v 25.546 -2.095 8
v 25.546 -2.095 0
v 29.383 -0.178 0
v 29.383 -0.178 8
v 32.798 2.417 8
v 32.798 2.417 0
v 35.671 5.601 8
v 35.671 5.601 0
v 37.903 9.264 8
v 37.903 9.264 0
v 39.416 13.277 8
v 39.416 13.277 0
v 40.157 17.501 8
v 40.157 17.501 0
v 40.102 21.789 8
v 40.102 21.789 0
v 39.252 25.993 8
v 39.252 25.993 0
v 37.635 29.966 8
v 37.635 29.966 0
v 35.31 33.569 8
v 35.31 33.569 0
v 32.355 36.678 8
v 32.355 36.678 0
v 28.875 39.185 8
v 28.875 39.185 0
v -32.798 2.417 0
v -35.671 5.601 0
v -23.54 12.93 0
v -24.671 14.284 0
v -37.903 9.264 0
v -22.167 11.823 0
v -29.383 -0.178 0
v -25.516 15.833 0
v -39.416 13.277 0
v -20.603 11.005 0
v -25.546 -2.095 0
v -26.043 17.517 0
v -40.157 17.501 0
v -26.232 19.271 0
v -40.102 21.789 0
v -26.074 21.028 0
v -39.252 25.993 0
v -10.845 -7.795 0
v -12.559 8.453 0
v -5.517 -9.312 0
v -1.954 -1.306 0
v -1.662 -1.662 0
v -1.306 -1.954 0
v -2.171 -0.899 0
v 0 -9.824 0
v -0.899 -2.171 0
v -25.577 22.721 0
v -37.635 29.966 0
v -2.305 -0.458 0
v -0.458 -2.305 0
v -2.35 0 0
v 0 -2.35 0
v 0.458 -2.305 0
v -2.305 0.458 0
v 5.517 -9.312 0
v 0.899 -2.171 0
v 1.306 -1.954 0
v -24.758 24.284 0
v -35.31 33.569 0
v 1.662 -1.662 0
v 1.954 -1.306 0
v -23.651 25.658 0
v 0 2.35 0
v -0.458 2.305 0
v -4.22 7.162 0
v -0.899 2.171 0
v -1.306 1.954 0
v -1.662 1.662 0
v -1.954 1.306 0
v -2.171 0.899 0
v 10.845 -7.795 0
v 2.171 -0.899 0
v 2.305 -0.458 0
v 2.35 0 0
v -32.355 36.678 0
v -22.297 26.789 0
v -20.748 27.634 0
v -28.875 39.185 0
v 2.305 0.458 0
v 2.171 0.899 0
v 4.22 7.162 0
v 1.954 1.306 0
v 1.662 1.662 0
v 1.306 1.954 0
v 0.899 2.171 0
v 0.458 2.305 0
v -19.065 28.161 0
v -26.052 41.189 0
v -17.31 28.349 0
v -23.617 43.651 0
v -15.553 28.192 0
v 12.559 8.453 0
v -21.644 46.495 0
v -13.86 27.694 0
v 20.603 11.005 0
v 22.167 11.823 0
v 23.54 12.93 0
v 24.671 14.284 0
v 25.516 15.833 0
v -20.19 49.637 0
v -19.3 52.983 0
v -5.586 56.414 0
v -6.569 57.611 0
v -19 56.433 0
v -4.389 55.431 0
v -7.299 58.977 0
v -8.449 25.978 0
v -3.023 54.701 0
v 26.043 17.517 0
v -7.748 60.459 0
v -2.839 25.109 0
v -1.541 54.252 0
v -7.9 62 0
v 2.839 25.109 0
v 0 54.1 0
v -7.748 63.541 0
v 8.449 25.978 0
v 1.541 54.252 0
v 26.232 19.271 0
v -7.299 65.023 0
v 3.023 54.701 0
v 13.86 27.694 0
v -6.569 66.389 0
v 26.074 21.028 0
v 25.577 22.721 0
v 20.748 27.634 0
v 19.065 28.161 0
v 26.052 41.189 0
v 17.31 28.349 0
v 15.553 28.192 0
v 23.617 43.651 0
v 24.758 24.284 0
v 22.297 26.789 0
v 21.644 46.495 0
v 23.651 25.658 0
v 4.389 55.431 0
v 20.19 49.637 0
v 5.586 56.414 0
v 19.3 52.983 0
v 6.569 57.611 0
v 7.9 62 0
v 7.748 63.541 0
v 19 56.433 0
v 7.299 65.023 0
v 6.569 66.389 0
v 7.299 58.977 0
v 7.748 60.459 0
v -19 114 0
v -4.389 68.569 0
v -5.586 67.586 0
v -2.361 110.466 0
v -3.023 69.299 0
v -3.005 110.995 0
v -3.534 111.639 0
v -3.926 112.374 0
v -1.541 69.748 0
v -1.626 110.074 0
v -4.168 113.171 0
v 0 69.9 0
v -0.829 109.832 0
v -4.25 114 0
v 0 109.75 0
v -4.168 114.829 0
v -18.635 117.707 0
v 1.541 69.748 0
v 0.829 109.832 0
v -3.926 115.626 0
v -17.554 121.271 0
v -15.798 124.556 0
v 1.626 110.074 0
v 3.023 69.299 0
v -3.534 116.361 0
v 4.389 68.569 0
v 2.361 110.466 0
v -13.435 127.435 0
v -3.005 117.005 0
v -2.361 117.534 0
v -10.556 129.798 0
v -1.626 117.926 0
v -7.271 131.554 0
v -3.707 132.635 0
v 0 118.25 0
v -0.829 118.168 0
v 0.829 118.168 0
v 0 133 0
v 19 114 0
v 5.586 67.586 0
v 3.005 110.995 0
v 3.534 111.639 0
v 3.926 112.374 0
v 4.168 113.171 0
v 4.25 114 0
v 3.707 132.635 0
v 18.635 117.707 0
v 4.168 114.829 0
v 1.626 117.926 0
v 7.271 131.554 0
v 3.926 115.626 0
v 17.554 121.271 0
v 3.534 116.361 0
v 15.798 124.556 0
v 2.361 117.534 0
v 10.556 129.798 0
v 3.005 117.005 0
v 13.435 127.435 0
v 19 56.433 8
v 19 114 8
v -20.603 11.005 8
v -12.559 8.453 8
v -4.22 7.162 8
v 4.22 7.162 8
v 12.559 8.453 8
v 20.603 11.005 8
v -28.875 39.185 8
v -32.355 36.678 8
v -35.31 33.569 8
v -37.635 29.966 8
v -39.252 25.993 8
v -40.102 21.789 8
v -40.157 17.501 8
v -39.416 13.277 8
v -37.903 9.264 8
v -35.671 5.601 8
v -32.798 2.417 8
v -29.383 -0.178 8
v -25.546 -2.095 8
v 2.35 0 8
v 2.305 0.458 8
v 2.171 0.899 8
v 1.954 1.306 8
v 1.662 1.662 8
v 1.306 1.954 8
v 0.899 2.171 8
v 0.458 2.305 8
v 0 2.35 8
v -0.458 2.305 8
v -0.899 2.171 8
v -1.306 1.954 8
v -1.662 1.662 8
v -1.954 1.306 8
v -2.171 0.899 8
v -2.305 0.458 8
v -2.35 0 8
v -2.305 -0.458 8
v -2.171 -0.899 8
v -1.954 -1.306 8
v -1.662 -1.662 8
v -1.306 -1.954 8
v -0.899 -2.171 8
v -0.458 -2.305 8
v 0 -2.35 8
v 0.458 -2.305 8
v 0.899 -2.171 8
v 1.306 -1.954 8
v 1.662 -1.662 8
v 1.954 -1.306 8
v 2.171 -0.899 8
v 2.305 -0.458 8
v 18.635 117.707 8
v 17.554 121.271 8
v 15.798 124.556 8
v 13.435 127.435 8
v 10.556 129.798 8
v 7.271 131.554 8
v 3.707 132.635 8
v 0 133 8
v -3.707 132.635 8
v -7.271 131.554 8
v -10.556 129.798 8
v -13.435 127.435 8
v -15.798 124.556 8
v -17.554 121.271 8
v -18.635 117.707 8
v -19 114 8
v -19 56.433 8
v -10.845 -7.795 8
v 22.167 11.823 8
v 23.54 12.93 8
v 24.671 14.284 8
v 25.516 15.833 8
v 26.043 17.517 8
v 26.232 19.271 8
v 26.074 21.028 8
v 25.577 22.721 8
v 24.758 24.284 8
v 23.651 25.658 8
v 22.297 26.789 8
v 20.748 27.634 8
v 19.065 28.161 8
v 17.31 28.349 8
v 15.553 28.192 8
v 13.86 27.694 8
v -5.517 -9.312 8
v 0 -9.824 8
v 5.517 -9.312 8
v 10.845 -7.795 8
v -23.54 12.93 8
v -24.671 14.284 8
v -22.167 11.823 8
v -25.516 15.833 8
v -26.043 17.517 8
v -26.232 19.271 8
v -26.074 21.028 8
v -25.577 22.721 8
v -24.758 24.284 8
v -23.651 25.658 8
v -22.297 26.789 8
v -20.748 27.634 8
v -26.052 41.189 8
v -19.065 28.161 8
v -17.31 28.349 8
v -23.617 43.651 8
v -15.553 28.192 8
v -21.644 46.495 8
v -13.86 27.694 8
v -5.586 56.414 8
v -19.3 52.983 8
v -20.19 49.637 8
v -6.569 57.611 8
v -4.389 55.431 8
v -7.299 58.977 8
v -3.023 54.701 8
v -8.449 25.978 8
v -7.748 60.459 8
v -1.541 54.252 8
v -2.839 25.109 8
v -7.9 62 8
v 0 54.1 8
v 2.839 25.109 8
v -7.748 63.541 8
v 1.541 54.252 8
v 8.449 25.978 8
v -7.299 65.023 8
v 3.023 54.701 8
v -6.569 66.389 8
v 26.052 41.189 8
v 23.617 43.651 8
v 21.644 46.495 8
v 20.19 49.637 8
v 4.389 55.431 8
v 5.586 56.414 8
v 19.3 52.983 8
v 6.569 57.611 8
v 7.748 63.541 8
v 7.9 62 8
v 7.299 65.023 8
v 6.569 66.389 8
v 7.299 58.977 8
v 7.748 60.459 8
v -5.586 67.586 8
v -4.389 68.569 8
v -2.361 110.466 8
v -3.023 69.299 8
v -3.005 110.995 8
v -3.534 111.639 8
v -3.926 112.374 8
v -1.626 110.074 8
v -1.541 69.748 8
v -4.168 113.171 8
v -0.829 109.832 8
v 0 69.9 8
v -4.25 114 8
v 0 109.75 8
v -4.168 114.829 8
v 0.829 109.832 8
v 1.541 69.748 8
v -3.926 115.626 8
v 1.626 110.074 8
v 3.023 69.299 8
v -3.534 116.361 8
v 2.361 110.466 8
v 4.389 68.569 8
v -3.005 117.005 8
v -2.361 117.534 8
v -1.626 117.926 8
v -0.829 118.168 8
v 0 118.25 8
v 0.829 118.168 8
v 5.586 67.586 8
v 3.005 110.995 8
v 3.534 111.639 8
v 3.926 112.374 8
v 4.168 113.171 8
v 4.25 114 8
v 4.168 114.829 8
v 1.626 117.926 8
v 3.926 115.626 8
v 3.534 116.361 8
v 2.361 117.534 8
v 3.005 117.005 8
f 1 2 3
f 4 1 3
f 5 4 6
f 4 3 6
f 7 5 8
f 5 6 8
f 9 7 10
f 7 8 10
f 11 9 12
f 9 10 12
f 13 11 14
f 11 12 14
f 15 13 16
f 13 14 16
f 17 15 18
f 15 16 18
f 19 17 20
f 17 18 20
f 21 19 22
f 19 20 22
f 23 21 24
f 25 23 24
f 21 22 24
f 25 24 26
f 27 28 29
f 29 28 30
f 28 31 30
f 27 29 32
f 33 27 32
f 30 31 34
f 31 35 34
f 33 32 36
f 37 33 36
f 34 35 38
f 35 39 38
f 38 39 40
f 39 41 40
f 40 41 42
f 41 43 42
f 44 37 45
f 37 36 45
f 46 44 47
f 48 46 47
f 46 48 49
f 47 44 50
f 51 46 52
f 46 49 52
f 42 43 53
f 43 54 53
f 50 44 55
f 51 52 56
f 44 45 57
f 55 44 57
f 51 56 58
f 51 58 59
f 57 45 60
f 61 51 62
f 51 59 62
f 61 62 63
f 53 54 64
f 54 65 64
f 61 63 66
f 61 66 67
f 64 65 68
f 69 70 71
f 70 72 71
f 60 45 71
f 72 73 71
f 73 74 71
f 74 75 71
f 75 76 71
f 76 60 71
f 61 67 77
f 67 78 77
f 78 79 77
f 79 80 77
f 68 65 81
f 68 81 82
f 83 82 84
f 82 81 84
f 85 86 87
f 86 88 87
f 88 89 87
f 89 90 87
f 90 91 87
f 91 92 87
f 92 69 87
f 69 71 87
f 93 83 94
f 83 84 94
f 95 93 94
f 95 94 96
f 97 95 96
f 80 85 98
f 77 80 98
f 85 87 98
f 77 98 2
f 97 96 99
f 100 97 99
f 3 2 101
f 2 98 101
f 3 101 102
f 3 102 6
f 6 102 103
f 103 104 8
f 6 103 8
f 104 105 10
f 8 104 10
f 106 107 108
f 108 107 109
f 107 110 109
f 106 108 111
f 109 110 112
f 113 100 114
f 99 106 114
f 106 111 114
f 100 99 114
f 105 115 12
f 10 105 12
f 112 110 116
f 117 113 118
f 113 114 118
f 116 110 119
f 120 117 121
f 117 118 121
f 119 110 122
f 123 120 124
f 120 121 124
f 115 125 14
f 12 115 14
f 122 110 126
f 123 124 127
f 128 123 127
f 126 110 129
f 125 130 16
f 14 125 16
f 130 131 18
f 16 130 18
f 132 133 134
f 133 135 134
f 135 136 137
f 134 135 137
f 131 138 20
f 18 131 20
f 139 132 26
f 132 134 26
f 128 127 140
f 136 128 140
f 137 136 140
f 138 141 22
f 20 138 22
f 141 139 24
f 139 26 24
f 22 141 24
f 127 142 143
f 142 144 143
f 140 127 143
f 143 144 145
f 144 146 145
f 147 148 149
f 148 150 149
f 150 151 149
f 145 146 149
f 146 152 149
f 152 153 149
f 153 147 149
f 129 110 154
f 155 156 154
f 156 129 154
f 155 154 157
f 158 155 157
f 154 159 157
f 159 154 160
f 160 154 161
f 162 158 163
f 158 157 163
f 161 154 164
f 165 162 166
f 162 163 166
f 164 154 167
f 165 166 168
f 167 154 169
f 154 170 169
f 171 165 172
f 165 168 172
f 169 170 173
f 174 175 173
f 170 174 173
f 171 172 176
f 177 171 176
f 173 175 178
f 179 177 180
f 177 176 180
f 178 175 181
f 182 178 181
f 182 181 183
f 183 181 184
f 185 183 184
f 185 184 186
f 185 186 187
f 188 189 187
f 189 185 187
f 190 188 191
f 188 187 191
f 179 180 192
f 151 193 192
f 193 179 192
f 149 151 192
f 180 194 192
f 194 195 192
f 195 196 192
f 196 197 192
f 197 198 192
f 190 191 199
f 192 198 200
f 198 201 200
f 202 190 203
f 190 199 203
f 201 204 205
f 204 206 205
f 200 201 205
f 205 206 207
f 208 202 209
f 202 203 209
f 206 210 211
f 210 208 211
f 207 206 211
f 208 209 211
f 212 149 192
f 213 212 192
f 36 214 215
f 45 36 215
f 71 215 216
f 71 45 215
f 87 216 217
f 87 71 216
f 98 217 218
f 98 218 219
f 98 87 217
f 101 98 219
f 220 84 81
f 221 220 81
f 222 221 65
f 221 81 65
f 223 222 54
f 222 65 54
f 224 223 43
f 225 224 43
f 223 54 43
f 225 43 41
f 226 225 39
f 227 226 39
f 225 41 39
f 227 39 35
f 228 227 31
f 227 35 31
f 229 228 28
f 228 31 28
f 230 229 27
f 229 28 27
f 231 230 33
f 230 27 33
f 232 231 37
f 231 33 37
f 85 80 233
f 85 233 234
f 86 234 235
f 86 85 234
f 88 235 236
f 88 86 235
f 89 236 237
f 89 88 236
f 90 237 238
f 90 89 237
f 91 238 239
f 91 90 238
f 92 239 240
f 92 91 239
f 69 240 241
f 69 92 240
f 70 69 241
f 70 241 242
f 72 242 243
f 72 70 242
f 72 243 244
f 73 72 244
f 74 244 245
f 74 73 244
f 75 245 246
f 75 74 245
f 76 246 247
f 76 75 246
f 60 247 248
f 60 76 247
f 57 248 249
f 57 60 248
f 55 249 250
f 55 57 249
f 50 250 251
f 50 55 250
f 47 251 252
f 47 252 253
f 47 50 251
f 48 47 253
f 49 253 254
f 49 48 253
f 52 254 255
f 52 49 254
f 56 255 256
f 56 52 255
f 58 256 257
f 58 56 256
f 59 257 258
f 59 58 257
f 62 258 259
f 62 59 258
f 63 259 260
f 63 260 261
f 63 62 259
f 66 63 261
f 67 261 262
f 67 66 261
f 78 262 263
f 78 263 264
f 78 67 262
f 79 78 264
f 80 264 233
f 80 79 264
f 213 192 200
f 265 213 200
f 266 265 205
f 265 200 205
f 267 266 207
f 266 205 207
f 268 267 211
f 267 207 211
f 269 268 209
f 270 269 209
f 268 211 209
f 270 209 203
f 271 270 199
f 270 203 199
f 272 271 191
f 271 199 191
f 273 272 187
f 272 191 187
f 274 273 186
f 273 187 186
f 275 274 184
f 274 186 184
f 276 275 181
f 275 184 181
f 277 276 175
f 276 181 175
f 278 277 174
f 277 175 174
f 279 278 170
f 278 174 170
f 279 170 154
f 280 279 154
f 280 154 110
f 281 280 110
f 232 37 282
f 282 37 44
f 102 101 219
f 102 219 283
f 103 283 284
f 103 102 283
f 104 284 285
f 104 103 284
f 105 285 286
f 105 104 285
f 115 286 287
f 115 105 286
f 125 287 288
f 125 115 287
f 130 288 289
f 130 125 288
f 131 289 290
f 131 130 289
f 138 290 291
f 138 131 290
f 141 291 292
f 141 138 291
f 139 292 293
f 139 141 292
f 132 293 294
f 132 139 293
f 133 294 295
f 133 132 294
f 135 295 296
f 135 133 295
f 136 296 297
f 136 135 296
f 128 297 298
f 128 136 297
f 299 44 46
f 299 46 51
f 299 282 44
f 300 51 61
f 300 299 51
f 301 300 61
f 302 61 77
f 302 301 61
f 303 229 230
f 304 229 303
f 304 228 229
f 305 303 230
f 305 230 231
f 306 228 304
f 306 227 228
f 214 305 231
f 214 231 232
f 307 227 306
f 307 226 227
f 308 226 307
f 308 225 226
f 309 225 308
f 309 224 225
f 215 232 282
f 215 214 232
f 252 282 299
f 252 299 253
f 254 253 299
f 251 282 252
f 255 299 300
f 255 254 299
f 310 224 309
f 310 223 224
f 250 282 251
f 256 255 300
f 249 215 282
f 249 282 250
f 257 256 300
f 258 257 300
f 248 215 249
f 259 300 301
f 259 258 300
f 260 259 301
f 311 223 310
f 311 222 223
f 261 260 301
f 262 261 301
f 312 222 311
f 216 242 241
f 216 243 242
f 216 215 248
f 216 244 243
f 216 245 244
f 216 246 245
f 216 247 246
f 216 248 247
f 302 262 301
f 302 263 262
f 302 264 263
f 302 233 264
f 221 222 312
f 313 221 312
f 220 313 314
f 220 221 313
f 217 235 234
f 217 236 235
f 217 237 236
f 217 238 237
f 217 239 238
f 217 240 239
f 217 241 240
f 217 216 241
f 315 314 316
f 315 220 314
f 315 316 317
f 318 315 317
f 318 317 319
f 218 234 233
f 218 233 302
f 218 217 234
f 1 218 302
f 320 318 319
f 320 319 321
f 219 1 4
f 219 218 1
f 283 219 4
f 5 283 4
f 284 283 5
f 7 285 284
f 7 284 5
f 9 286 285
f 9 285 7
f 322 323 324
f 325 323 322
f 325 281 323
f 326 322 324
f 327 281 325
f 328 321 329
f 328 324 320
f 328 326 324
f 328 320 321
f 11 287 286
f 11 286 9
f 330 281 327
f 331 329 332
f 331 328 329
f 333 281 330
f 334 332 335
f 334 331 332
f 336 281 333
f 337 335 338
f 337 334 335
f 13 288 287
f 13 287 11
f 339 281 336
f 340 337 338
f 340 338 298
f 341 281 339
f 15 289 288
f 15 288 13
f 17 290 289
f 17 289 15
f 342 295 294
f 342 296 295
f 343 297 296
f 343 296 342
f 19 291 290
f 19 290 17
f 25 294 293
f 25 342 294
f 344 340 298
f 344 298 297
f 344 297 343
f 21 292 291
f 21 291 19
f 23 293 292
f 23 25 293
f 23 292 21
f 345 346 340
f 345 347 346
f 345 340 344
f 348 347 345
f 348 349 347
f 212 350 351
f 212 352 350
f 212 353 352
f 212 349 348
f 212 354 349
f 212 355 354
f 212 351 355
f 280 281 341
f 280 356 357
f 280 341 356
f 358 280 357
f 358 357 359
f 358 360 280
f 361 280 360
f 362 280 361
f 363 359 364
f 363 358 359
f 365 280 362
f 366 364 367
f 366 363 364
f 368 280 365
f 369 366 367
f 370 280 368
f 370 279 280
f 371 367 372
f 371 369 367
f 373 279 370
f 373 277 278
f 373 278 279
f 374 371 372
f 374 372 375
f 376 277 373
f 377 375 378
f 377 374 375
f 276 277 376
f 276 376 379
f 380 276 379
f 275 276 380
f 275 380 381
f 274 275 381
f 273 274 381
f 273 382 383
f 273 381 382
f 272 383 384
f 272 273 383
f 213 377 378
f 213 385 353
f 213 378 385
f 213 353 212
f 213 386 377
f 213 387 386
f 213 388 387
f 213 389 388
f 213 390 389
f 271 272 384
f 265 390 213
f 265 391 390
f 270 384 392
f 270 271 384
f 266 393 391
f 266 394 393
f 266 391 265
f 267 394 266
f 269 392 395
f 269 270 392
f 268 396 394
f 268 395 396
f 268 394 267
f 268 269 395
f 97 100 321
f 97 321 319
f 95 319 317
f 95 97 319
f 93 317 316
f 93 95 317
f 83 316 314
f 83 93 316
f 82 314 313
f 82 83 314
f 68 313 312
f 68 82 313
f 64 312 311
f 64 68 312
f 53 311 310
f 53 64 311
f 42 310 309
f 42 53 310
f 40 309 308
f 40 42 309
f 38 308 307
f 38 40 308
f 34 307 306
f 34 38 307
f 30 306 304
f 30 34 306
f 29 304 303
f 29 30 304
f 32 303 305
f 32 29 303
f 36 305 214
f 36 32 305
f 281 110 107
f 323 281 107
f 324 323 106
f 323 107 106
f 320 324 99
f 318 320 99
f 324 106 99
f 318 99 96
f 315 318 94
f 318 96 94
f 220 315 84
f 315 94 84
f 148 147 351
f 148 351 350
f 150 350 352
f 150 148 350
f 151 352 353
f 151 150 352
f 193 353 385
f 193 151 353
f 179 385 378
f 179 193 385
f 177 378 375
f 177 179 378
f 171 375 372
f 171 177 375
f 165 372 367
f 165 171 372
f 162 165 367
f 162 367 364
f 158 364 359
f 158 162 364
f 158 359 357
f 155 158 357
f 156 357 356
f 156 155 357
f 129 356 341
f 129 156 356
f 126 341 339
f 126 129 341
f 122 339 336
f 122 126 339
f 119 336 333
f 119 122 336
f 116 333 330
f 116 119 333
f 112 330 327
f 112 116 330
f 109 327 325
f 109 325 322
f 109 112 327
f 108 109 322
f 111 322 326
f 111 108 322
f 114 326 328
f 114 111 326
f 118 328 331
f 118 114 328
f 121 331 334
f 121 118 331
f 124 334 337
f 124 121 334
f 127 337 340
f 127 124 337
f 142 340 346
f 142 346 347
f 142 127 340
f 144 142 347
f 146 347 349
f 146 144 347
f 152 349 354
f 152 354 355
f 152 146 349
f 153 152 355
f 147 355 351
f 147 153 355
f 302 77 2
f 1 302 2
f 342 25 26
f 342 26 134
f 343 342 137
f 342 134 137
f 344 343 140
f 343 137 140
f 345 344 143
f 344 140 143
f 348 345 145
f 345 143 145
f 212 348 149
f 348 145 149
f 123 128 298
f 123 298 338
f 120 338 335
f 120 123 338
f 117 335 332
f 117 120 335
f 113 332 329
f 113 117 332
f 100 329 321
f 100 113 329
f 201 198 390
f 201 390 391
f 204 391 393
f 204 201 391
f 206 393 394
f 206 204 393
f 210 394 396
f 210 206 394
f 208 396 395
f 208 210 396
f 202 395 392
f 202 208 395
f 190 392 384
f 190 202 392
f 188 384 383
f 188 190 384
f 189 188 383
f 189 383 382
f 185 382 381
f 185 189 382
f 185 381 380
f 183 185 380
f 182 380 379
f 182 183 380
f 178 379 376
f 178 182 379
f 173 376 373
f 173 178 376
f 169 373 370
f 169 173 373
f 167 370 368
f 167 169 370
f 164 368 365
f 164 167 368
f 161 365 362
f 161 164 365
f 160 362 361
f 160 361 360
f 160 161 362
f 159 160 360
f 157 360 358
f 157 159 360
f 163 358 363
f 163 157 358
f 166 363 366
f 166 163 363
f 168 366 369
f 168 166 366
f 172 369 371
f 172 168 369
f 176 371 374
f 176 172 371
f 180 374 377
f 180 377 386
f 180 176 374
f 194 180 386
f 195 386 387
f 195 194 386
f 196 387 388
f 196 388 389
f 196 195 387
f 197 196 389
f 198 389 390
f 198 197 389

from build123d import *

# Parameters (mm, degrees)
SKETCH_1_R      = 7.9
SKETCH_1_R_2    = 4.25
SKETCH_1_R_3    = 2.35
EXTRUDE_1_DEPTH = 8
FILLET_1_R      = 30


with BuildPart() as part:
    # Эскиз1 → Бобышка-Вытянуть1 (new body)
    with BuildSketch(Plane.XY):
        with BuildLine():
            Line((-19, 114), (-19, 56.432557211))
            ThreePointArc((-19, 56.432557211), (-21.643532577, 46.495100866), (-28.875303859, 39.18464348))
            ThreePointArc((-28.875303859, 39.18464348), (-40.157482483, 17.500808258), (-25.546486414, -2.094983595))
            Line((-25.546486414, -2.094983595), (0, -12))
            Line((0, -12), (25.546486414, -2.094983595))
            ThreePointArc((25.546486414, -2.094983595), (40.157482483, 17.500808258), (28.875303859, 39.18464348))
            ThreePointArc((28.875303859, 39.18464348), (21.643532577, 46.495100866), (19, 56.432557211))
            Line((19, 56.432557211), (19, 114))
            ThreePointArc((19, 114), (0, 133), (-19, 114))
        make_face()
        with Locations((0, 62)):
            Circle(SKETCH_1_R, mode=Mode.SUBTRACT)
        with Locations((0, 114)):
            Circle(SKETCH_1_R_2, mode=Mode.SUBTRACT)
        Circle(SKETCH_1_R_3, mode=Mode.SUBTRACT)
        with BuildLine():
            ThreePointArc((-20.603362638, 11.004887999), (0, 7), (20.603362638, 11.004887999))
            ThreePointArc((20.603362638, 11.004887999), (25.576557988, 22.721002031), (13.860443956, 27.694197381))
            ThreePointArc((13.860443956, 27.694197381), (0, 25), (-13.860443956, 27.694197381))
            ThreePointArc((-13.860443956, 27.694197381), (-25.576557988, 22.721002031), (-20.603362638, 11.004887999))
        make_face(mode=Mode.SUBTRACT)
    extrude(amount=EXTRUDE_1_DEPTH)

    # Скругление1
    fillet_1_edges = [part.edges().sort_by_distance(p)[0] for p in [
        (0, -12, 4),
    ]]
    fillet(fillet_1_edges, radius=FILLET_1_R)


solid = part.part
